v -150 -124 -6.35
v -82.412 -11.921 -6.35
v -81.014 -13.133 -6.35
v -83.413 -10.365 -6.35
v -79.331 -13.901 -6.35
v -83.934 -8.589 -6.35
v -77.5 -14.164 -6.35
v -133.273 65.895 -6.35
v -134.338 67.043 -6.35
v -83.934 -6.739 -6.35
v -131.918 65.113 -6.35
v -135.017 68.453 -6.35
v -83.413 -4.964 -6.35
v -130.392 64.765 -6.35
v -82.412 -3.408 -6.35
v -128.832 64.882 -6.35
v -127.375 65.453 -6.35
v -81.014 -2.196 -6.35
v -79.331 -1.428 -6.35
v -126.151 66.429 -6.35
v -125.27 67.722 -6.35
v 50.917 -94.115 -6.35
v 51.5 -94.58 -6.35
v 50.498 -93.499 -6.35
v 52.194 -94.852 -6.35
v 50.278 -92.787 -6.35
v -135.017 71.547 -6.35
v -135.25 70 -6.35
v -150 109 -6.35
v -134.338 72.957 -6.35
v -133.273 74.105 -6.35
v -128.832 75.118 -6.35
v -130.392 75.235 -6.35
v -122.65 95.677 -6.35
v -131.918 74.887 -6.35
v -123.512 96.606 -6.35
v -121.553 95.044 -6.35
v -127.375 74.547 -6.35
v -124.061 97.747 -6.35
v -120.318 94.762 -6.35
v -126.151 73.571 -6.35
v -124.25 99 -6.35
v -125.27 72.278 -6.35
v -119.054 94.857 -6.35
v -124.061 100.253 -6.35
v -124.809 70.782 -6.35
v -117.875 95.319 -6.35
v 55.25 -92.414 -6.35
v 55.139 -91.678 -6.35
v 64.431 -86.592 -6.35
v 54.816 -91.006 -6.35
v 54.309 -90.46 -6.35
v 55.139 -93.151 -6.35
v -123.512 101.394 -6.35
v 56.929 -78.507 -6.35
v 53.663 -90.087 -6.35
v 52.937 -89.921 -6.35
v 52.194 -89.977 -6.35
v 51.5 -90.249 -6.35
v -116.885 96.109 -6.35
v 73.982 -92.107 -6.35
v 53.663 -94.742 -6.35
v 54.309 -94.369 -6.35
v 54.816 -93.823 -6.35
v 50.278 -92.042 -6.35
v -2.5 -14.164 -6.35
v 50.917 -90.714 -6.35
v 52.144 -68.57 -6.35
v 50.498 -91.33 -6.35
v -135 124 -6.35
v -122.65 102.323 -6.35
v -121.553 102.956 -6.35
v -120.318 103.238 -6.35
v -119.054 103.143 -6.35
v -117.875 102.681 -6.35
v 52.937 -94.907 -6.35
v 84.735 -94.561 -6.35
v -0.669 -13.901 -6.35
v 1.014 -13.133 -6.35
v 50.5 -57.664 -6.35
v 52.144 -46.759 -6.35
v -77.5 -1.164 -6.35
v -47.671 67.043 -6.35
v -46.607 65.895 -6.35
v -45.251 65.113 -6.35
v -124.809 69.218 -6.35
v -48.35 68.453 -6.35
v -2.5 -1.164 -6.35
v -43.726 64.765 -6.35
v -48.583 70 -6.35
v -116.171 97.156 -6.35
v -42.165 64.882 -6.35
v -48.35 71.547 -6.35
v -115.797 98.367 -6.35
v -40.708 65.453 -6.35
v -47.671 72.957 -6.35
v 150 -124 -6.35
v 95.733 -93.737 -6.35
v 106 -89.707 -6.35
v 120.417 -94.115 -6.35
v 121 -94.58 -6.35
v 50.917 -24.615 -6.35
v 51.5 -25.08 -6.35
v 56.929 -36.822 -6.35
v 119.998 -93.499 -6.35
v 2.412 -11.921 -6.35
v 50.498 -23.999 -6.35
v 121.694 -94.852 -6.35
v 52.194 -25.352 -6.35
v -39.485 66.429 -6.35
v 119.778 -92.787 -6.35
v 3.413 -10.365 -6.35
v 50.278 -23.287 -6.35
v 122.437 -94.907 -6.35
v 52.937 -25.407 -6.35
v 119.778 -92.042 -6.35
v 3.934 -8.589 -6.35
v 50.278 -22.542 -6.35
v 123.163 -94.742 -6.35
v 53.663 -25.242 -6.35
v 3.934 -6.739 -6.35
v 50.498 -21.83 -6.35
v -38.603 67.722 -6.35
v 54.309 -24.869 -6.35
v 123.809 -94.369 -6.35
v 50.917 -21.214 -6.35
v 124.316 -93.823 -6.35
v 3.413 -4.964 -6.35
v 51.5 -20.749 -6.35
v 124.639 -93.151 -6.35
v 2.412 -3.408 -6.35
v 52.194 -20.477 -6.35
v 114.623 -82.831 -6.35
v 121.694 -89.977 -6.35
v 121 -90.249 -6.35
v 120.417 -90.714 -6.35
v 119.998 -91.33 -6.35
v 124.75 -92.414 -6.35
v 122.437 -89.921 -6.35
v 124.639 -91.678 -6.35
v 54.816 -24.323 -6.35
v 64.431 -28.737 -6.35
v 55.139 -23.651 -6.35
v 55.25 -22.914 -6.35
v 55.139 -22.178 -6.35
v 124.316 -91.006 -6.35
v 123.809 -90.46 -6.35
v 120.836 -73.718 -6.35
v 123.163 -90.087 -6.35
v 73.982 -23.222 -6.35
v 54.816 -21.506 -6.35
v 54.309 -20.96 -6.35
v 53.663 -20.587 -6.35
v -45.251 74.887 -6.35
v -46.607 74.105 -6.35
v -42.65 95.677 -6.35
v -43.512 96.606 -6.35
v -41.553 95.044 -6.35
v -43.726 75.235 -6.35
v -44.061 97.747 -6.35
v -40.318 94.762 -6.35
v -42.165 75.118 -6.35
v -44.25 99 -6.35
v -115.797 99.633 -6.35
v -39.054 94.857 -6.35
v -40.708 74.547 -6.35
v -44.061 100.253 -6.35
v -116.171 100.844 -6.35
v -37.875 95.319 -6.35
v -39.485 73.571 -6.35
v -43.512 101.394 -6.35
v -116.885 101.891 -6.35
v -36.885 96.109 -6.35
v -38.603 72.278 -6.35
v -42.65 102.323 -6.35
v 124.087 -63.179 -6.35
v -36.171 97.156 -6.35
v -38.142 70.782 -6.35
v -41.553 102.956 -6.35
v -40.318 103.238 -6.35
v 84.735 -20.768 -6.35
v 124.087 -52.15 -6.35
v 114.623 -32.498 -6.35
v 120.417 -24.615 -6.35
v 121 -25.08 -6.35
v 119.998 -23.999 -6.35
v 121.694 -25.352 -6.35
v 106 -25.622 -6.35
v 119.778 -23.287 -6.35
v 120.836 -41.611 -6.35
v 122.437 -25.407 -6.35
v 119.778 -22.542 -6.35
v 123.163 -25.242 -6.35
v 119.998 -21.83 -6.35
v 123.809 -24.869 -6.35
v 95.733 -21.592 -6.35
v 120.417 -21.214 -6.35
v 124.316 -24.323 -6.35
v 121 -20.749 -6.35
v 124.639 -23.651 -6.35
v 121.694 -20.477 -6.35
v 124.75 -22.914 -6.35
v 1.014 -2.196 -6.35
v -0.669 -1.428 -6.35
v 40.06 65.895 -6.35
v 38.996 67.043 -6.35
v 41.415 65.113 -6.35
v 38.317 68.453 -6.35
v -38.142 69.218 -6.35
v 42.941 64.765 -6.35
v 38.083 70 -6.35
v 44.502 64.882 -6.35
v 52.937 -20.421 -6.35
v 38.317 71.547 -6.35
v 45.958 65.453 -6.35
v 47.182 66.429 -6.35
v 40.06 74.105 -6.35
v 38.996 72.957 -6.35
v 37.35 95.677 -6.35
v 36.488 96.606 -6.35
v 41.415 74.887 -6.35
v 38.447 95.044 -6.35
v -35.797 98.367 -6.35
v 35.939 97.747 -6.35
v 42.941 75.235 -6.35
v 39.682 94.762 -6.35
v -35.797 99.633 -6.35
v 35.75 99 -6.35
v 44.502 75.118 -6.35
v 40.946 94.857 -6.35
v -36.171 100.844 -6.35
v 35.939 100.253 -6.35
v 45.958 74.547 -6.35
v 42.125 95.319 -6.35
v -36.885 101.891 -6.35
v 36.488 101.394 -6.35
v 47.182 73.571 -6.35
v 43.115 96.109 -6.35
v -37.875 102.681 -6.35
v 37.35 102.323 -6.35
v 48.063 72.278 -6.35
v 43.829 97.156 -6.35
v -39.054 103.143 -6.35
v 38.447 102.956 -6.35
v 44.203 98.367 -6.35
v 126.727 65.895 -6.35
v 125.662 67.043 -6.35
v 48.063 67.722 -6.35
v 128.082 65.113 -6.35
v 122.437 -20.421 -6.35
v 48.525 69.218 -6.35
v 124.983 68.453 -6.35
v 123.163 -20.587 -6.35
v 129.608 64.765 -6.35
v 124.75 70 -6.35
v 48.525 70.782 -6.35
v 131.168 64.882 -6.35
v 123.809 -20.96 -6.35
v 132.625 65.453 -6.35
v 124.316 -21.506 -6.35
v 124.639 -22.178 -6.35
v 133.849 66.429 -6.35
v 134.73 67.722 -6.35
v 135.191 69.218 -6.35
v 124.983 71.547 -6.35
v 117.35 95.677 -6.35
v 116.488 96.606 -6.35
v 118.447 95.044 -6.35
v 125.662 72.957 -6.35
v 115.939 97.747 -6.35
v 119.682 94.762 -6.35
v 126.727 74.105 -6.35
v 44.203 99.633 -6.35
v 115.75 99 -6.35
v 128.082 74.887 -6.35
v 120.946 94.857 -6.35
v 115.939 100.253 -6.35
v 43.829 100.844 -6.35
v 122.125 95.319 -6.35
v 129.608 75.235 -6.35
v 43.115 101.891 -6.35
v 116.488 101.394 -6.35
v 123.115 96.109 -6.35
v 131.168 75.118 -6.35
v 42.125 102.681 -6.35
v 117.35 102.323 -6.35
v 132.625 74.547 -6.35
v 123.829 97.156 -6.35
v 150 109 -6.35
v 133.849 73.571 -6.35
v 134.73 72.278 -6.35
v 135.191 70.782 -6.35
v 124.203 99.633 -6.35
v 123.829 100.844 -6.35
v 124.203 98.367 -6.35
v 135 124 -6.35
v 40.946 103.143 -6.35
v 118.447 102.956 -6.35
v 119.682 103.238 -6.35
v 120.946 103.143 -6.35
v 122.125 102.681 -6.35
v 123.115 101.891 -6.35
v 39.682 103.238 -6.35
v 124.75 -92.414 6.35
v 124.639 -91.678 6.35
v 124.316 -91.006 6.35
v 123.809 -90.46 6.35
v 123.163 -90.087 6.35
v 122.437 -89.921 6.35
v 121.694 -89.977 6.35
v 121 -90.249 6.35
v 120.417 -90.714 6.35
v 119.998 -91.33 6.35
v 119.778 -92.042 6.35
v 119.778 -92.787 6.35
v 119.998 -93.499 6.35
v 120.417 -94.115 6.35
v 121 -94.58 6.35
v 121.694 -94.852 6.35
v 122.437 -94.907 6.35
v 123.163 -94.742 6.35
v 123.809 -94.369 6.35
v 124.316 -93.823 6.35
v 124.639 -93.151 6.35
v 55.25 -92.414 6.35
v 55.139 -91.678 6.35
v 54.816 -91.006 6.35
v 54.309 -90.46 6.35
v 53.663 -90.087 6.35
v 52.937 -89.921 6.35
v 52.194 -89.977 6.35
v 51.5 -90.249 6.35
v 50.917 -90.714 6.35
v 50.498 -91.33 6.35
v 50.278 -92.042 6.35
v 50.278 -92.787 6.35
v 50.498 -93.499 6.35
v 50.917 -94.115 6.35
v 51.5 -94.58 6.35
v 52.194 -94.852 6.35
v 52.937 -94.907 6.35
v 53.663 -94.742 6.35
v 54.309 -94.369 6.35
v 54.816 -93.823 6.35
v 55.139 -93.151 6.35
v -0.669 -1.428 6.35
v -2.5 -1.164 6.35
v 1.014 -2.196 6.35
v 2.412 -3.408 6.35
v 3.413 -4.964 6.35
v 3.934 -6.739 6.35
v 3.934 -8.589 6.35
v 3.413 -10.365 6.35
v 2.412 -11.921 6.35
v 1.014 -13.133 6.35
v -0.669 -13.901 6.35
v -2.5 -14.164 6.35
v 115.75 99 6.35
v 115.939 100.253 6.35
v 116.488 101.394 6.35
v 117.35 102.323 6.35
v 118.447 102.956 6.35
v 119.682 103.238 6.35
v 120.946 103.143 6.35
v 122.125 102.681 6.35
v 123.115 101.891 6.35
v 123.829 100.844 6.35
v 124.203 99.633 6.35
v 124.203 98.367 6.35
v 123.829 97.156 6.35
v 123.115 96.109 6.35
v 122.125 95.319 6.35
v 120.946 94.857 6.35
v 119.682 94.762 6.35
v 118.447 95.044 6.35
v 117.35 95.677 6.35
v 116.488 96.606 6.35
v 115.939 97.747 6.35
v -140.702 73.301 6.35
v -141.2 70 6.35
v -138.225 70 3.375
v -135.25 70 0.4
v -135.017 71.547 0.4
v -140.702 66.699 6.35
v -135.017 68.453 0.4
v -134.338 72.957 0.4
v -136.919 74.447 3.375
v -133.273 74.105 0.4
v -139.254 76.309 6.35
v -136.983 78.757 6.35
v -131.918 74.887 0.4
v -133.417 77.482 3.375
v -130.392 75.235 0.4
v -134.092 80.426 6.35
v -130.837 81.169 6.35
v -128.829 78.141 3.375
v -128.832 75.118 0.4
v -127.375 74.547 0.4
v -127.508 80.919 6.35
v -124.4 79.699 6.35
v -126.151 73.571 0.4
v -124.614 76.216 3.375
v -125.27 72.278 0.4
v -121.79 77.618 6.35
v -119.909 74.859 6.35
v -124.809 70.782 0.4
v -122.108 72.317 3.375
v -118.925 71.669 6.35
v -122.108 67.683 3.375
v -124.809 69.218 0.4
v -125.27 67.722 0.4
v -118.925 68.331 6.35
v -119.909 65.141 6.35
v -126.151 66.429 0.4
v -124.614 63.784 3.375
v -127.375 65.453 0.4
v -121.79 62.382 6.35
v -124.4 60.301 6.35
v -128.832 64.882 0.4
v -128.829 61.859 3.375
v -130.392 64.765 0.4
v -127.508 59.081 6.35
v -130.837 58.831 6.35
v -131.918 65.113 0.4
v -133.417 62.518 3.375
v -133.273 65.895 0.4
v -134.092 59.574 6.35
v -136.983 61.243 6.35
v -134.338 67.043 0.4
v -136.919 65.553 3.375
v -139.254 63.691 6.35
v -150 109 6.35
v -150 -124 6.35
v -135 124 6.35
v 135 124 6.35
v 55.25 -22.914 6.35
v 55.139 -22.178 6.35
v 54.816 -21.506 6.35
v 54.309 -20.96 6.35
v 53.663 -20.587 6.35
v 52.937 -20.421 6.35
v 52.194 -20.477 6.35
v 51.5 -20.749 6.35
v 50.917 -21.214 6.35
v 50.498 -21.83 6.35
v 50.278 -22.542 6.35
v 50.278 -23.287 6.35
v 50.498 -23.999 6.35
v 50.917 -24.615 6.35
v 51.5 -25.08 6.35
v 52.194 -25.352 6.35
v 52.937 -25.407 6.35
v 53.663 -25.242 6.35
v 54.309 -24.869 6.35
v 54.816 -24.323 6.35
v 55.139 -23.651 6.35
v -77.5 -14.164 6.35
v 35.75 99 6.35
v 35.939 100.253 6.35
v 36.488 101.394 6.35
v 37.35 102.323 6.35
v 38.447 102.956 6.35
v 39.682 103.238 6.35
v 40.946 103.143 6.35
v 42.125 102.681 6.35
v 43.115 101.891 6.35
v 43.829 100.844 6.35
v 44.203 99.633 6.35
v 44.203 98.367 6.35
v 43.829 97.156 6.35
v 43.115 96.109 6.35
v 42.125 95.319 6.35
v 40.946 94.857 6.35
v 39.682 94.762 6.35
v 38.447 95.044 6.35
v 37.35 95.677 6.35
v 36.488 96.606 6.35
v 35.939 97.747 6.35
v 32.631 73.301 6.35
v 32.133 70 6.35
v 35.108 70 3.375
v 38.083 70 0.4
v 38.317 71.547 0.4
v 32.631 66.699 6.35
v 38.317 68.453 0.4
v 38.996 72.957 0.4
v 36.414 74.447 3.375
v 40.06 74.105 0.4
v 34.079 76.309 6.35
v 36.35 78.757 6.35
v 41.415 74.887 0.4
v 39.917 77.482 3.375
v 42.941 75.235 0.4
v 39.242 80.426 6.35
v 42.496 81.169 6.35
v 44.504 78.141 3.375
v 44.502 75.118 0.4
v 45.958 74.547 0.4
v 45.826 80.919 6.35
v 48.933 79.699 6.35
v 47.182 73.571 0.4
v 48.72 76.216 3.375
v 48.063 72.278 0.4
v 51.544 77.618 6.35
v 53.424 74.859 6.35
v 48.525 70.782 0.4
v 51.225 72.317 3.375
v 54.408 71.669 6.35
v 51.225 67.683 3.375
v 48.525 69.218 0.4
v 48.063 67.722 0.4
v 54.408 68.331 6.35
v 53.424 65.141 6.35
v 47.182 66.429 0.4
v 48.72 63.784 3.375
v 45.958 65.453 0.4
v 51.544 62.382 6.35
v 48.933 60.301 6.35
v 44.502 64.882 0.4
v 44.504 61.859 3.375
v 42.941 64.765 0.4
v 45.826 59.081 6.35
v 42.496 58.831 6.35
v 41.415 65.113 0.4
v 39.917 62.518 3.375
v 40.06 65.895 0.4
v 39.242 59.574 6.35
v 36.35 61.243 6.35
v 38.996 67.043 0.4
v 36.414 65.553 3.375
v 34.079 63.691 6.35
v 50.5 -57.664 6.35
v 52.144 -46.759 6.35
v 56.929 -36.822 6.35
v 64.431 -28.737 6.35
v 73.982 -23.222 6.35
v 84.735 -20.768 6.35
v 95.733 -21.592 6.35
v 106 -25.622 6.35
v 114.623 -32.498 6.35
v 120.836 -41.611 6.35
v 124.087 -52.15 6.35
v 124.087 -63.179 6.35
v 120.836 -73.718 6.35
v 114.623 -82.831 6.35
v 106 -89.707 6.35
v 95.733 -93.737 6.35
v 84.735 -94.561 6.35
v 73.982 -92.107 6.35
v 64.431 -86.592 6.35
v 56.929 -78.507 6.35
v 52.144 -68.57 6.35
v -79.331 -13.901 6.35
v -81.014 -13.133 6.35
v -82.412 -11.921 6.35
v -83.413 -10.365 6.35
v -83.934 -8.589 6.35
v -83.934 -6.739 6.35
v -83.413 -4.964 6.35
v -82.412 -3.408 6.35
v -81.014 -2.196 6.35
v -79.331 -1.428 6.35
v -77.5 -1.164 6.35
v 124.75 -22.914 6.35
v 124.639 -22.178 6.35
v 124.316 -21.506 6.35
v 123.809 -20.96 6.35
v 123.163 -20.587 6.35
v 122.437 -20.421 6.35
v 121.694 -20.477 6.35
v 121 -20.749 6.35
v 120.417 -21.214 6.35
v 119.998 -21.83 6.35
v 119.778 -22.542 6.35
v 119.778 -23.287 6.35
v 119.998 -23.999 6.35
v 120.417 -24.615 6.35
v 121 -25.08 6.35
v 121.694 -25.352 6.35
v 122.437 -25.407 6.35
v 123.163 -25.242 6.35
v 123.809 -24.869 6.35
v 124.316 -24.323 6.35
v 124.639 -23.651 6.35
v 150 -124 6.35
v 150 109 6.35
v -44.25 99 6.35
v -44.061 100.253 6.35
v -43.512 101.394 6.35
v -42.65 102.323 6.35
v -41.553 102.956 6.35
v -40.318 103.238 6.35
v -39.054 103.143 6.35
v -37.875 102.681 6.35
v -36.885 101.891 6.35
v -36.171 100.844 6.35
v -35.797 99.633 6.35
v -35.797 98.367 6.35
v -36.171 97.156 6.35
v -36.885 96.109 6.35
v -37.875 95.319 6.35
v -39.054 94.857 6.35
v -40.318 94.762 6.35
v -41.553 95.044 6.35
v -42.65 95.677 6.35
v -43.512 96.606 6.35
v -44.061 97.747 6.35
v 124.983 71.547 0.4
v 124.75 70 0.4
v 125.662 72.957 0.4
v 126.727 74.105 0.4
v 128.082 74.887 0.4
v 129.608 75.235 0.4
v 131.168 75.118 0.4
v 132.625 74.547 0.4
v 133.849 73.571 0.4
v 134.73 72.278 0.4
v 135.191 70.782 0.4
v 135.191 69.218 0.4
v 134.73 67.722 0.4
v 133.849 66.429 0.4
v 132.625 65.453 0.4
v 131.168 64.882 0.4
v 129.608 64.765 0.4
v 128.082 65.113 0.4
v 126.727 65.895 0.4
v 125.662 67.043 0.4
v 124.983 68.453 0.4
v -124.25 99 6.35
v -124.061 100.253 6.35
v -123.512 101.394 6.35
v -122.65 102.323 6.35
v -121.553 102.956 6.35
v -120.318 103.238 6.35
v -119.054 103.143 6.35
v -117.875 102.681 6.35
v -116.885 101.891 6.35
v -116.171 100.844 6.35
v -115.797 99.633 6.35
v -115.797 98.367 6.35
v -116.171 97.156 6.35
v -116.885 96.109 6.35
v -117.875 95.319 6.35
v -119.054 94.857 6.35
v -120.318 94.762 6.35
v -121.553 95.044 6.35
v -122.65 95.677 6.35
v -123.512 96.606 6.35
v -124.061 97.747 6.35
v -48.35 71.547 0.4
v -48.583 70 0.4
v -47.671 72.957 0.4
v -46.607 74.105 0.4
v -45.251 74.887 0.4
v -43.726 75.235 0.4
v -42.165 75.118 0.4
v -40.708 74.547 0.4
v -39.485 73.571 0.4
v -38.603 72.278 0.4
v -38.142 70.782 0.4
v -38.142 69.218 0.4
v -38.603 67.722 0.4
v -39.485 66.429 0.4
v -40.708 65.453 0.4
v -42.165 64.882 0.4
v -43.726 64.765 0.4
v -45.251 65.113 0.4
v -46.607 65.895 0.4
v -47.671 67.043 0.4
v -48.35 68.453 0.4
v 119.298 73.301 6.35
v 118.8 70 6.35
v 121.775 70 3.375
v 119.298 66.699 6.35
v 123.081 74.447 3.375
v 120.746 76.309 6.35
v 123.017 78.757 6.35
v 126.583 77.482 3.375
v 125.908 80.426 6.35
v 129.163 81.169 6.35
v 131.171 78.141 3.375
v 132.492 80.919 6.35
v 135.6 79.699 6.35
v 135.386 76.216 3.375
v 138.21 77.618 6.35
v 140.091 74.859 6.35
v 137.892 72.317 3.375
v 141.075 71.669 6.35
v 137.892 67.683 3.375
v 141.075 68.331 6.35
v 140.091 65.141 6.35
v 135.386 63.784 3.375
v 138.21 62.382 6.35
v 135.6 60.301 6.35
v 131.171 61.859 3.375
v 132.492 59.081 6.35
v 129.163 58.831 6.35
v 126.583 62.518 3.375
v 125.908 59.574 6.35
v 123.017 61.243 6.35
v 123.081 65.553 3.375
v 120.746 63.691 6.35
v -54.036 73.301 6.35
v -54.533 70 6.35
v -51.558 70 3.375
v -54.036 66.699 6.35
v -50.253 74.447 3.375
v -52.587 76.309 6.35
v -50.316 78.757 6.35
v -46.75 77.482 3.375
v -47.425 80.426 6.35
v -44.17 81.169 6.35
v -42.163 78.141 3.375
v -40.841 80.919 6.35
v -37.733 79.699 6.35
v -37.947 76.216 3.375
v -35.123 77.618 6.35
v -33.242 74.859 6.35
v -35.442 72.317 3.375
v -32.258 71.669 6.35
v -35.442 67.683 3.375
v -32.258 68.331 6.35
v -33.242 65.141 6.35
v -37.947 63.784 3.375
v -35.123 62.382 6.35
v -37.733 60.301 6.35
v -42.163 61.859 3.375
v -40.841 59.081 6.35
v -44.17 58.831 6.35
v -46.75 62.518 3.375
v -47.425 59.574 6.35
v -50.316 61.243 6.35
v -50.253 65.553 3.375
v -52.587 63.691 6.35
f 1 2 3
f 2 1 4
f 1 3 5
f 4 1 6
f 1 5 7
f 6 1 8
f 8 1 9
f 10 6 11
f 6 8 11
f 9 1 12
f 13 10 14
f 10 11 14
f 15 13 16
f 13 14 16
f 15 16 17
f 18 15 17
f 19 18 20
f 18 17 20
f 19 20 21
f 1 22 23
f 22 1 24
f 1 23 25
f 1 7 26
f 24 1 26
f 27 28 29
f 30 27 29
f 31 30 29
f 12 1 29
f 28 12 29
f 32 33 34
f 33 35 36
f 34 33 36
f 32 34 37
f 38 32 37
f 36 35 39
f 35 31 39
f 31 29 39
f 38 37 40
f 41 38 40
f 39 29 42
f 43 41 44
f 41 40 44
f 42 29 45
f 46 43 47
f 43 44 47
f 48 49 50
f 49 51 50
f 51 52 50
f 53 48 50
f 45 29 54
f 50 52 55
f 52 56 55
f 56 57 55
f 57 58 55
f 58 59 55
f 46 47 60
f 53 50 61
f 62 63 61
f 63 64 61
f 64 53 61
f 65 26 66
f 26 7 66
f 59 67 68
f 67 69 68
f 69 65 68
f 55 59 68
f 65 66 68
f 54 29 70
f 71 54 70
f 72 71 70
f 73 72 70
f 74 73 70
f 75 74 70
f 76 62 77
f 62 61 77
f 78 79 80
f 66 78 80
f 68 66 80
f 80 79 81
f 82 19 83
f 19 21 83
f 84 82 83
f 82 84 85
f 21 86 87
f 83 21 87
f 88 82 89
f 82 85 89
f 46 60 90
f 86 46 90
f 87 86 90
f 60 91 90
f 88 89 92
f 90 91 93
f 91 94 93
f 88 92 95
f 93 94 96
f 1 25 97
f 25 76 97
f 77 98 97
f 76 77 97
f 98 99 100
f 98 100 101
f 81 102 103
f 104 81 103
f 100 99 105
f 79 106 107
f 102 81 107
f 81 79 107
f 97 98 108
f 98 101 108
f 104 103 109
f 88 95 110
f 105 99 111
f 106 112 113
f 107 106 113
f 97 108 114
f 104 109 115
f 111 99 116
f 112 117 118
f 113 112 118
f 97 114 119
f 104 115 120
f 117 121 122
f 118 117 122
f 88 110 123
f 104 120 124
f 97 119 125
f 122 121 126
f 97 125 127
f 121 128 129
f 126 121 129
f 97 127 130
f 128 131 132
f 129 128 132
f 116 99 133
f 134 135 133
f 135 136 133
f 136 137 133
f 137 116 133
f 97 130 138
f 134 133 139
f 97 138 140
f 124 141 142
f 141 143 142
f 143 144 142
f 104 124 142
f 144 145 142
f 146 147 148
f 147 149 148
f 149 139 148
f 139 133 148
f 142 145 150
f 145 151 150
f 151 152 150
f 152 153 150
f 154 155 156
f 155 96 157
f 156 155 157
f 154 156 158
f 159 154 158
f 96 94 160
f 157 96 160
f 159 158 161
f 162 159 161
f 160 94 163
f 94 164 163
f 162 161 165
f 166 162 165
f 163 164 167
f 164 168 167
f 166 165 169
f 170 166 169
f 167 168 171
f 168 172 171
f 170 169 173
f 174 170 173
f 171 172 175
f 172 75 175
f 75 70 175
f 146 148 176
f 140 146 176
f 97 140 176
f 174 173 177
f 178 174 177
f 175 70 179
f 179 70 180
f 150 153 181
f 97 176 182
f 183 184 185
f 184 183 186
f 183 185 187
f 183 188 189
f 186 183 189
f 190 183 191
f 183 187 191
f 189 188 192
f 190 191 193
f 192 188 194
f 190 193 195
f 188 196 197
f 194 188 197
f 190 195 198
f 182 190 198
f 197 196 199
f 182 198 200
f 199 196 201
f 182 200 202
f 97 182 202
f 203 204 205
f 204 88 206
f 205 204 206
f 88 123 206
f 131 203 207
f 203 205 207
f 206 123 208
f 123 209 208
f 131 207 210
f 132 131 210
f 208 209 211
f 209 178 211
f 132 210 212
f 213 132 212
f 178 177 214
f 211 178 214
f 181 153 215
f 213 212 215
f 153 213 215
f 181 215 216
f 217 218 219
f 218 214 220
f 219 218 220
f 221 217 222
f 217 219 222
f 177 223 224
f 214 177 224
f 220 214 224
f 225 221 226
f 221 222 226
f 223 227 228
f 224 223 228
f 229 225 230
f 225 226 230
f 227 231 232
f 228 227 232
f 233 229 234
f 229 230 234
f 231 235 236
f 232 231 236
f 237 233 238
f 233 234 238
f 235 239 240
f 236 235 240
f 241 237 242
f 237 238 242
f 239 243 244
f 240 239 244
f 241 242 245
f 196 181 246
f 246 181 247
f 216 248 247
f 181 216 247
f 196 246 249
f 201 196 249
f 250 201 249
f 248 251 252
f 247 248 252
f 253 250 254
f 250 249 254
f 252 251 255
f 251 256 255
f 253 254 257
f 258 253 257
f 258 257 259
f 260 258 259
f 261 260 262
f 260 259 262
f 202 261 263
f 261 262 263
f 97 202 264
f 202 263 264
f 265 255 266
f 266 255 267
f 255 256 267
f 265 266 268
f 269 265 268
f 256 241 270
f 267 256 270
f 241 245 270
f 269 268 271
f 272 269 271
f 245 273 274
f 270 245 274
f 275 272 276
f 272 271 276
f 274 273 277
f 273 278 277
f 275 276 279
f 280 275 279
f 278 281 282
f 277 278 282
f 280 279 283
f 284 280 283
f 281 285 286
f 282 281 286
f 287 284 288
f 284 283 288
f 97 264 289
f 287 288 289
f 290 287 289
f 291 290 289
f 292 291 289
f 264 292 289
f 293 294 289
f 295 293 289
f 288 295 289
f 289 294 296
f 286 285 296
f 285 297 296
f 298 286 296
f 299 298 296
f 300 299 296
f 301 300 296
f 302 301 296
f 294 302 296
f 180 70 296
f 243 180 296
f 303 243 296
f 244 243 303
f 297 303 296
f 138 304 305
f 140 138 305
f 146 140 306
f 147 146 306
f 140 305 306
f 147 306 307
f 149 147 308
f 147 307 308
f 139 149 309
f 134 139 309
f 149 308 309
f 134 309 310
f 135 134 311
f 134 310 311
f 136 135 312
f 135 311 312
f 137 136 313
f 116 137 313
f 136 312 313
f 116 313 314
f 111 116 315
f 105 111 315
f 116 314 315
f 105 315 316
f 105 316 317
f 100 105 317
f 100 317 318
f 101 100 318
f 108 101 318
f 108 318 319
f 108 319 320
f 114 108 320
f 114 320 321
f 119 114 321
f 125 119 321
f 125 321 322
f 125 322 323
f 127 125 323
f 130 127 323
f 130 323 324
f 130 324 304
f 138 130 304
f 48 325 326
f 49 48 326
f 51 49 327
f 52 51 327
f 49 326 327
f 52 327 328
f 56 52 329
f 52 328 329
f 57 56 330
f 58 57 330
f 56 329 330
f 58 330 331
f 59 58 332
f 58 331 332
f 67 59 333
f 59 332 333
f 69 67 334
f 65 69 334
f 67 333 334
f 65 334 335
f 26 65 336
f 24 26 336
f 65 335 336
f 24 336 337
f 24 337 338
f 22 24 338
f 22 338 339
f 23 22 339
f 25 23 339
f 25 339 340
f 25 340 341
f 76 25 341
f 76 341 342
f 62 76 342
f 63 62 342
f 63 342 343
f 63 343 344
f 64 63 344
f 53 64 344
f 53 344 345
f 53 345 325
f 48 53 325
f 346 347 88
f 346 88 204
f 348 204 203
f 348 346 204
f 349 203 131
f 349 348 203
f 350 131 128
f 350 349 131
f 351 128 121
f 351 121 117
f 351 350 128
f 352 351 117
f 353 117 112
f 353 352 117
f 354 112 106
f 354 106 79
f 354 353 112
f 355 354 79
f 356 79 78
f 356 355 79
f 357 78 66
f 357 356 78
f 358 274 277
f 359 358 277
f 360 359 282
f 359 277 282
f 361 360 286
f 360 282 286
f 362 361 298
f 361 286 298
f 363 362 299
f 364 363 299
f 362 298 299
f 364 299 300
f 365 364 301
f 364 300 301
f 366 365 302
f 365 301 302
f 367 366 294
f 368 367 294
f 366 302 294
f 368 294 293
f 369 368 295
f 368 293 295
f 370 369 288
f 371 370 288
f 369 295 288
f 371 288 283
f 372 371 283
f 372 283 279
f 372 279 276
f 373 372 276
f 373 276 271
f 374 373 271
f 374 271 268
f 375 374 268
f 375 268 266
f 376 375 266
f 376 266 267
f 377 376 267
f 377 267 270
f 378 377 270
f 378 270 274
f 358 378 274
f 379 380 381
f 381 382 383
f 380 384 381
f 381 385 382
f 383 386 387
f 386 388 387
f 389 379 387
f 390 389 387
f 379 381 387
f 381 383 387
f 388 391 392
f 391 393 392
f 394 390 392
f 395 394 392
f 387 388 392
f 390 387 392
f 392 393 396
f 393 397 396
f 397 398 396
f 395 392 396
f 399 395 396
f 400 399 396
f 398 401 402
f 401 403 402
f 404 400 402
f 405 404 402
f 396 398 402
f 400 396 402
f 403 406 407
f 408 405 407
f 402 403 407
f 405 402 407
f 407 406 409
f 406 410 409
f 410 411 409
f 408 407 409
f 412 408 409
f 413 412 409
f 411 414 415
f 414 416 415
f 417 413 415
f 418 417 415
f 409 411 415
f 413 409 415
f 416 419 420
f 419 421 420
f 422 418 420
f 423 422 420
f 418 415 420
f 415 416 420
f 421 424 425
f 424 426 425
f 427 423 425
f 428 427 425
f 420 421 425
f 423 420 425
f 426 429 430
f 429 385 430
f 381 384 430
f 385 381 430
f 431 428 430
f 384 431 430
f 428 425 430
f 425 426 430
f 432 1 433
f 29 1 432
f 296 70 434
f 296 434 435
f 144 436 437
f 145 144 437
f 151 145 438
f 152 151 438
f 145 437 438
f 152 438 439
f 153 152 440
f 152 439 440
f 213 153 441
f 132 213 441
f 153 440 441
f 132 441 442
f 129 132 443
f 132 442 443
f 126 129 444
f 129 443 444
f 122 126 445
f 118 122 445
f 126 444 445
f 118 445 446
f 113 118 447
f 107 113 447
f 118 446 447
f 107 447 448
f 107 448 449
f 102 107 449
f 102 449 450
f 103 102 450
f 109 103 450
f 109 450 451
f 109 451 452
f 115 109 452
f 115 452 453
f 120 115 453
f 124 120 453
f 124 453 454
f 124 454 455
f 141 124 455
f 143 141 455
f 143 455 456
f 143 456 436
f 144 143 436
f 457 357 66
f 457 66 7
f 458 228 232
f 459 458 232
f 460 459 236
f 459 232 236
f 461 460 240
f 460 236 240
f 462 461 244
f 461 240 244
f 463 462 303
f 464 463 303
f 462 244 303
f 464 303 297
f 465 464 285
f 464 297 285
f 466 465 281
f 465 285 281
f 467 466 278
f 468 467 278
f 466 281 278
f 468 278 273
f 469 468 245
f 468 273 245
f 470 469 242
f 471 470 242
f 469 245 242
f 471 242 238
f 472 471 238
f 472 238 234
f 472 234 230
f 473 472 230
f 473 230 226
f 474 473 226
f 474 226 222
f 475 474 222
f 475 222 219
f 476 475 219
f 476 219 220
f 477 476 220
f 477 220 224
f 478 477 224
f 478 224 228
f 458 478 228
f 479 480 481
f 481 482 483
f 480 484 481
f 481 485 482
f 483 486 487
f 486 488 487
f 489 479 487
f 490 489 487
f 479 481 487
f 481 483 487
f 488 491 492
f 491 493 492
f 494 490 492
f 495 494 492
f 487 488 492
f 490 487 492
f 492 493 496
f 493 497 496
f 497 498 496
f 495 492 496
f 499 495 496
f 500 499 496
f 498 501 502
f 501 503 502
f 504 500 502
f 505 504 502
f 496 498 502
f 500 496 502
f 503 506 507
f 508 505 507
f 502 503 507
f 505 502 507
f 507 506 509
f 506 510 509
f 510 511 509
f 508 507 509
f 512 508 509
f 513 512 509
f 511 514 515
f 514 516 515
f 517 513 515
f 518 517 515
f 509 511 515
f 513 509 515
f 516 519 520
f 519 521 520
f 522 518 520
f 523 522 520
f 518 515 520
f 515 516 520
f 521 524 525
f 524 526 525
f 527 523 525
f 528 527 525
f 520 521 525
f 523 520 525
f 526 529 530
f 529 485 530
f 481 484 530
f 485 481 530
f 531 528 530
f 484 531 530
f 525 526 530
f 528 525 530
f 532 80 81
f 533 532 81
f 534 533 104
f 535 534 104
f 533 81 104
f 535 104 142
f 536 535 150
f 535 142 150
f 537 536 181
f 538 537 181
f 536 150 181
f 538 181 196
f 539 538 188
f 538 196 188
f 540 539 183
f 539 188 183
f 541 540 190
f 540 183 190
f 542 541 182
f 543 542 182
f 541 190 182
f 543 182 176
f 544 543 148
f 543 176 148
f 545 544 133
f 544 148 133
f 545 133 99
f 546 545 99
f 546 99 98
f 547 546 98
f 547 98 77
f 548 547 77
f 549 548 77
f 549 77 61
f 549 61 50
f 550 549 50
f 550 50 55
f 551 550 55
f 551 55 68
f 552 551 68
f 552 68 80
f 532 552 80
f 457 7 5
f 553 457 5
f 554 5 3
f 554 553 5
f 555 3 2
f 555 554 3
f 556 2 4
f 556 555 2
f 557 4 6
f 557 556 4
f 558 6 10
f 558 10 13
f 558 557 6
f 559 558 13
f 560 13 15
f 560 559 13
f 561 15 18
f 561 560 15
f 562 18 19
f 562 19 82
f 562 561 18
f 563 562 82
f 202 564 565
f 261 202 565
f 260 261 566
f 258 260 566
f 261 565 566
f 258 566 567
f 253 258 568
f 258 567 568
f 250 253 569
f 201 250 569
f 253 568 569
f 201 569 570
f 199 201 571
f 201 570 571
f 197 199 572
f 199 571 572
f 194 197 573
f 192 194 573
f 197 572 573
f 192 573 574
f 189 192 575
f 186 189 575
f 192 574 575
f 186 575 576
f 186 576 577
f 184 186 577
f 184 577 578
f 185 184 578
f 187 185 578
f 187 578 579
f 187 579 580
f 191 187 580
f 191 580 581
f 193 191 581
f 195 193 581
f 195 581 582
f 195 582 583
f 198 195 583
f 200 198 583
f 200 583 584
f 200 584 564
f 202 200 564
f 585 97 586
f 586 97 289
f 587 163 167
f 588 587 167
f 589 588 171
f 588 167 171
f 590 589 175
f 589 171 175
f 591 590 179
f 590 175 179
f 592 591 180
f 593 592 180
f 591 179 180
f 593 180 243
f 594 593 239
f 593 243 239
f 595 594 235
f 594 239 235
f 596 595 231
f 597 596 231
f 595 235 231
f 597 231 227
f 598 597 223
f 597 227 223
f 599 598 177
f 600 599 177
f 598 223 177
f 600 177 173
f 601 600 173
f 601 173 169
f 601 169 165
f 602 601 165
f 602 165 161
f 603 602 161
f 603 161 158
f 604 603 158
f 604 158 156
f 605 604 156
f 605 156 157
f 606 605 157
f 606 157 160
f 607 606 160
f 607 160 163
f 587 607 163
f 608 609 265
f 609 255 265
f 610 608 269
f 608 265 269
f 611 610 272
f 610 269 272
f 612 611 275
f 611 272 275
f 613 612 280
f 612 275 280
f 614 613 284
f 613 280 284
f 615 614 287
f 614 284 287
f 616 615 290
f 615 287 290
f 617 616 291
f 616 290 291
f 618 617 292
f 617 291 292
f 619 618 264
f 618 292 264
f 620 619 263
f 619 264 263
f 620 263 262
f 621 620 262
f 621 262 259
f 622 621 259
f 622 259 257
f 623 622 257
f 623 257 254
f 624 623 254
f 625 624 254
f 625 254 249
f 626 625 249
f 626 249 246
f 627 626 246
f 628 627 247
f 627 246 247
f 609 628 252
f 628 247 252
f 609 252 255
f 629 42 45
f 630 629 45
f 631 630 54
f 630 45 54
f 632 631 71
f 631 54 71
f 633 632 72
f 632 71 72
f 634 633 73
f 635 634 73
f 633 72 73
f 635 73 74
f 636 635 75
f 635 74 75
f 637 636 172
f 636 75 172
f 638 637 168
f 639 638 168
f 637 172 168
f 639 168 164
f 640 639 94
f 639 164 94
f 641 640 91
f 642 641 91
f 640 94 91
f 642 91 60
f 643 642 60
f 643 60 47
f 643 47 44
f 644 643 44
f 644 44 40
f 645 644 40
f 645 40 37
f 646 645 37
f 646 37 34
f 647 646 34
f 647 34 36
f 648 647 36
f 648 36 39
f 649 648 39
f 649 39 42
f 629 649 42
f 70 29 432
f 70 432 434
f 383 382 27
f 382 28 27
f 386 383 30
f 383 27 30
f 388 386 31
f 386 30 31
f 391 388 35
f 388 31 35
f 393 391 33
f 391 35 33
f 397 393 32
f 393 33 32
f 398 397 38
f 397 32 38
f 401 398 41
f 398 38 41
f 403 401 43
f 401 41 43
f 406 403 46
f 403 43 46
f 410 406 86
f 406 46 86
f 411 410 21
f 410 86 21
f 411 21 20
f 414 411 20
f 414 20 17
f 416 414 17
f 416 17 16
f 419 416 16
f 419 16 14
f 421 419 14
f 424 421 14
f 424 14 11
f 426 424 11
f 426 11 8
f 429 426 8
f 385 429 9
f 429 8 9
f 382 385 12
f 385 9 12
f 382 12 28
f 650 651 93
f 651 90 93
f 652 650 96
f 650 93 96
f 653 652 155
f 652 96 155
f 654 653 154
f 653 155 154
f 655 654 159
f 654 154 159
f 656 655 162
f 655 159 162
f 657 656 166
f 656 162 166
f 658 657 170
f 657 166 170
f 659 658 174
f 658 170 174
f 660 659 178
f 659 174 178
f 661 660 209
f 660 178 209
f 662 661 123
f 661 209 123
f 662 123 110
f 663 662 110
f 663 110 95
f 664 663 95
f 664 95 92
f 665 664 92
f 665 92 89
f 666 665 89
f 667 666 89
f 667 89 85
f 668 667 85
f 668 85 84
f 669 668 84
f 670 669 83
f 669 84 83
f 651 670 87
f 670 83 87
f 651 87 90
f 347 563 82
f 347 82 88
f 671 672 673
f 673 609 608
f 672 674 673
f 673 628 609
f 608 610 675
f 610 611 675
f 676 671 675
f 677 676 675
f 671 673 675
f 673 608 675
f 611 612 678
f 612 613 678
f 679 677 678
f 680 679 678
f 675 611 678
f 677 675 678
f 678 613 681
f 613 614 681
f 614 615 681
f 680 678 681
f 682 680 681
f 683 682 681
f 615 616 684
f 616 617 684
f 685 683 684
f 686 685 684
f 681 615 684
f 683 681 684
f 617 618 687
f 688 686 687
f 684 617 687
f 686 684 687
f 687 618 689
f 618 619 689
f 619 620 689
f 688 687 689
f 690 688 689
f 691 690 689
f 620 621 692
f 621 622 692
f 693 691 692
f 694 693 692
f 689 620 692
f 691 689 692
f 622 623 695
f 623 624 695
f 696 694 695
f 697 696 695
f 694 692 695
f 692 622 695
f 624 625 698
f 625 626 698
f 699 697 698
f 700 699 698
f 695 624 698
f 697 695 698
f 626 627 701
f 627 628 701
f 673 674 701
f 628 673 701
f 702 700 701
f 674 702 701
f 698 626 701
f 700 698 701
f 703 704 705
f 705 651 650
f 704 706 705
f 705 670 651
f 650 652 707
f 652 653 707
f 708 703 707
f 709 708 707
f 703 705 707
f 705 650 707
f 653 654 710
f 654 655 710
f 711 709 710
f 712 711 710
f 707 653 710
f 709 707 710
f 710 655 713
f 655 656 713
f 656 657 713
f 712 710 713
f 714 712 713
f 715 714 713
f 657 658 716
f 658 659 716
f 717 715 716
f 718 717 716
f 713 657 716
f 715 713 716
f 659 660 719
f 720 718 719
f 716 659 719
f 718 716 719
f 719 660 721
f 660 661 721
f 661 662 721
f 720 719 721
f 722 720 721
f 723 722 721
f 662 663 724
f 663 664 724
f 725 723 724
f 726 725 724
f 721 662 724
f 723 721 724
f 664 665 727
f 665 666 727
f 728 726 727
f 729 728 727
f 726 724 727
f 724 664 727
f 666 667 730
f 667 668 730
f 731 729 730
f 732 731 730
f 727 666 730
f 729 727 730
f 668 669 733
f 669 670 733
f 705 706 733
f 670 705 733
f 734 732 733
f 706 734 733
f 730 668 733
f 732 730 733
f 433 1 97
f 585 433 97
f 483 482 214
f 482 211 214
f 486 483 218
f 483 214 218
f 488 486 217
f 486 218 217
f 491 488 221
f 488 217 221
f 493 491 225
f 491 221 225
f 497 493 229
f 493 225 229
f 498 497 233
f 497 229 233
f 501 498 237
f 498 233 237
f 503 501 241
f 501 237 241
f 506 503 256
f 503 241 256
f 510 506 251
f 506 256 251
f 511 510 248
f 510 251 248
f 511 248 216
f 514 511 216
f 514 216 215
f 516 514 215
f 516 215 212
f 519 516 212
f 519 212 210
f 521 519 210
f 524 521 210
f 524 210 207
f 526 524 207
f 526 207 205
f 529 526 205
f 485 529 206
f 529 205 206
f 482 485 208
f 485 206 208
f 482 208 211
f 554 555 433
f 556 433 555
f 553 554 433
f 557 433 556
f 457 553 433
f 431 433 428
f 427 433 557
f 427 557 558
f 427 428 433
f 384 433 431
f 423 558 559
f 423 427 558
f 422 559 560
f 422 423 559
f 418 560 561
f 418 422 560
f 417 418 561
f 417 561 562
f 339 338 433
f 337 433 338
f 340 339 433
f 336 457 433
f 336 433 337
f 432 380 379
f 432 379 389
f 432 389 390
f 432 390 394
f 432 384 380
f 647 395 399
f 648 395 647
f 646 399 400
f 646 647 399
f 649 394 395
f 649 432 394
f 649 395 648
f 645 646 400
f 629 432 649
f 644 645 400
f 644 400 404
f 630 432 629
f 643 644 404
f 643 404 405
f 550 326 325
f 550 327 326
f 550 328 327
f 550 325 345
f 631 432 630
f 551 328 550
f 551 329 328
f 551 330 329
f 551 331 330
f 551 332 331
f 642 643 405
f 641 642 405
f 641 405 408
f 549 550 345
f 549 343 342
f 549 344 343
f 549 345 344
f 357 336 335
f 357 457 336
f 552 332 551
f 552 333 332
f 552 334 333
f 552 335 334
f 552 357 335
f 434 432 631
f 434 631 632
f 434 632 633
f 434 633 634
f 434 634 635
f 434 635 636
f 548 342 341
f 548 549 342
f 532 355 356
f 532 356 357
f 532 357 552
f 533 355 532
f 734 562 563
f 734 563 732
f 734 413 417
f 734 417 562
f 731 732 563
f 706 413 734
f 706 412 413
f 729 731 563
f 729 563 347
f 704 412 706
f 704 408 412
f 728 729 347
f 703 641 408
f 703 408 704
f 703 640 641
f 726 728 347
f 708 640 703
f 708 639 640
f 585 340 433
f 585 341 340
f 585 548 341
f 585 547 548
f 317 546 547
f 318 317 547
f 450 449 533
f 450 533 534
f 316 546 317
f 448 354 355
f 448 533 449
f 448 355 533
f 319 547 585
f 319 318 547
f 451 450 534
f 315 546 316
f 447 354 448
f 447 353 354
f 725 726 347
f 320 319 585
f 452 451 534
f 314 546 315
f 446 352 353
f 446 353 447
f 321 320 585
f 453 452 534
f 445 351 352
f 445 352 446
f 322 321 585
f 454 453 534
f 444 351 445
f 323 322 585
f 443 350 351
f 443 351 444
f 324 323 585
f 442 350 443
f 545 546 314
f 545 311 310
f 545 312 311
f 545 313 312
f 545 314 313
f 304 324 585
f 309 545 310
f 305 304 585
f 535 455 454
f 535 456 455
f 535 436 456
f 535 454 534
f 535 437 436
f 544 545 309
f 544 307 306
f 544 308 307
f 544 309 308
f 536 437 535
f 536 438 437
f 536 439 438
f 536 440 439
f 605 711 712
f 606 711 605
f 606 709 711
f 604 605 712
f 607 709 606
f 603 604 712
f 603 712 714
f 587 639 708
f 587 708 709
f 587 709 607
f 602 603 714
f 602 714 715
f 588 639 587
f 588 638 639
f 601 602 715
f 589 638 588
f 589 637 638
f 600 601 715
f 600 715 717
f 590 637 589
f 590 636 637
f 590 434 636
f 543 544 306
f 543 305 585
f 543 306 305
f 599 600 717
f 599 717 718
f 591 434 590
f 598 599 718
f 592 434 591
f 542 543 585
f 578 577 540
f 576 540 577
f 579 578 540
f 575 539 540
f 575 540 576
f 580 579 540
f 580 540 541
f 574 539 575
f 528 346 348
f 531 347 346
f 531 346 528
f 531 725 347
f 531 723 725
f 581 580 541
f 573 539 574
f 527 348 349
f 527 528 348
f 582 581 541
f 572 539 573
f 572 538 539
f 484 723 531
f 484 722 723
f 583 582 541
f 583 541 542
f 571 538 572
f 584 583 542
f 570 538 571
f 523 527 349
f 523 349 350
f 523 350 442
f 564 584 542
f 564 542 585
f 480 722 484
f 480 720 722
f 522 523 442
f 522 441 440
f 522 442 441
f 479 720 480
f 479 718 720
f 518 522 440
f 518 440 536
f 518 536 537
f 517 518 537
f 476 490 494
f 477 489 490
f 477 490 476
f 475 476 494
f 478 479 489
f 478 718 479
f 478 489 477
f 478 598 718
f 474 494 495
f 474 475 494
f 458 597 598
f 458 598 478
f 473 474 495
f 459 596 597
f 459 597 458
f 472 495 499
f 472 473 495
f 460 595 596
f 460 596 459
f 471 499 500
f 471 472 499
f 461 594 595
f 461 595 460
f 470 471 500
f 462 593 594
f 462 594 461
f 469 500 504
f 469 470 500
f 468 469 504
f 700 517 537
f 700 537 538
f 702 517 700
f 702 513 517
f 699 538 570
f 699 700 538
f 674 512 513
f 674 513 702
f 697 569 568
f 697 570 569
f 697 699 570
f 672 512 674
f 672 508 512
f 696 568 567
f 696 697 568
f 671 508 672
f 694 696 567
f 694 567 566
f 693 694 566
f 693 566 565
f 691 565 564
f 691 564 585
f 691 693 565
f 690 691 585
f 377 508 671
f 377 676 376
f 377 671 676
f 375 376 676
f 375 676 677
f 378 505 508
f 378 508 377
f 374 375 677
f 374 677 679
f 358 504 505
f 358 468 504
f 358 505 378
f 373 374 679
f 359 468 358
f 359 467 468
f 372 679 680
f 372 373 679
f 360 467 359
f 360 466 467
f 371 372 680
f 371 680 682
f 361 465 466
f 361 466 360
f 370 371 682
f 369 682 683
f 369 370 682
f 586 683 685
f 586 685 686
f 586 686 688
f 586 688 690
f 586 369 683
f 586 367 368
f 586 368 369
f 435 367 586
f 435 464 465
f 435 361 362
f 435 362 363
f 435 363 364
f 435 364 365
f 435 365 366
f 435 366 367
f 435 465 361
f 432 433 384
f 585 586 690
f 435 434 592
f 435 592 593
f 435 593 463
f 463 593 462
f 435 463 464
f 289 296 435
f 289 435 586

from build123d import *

# Parameters (mm, degrees)
FLANGE_BASE1_START                    = -6.35
FLANGE_BASE1_OUTLINE_W                = 300
FLANGE_BASE1_OUTLINE_H                = 248
FLANGE_BASE1_DEPTH                    = 12.7
QUEBRA_CANTO1_START                   = -6.35
QUEBRA_CANTO1_DEPTH                   = 12.7
FURO_ROSCADO_DE_M10X1_52_D            = 8.5
FURO_ROSCADO_DE_M10X1_52_DEPTH        = 29.946342369
FURO_ROSCADO_DE_M10X1_52_TIP          = 2.553657631
ESBO_O11_R                            = 16.5
CORTE_EXTRUS_O1_DEPTH                 = 196.031510275
ESBO_O12_R                            = 37
CORTE_EXTRUS_O2_DEPTH                 = 196.031510275
FURO_ROSCADO_DE_M6X1_01_D             = 5
CORTE_EXTRUS_O5_DEPTH                 = 12.7
ESCAREADO_PARA_SFHCS_M101_D           = 10.5
ESCAREADO_PARA_SFHCS_M101_DEPTH       = 32.5
ESCAREADO_PARA_SFHCS_M101_CSINK_D     = 22.4
ESCAREADO_PARA_SFHCS_M101_CSINK_ANGLE = 90
ESCAREADO_PARA_SFHCS_M101_TIP         = 3.15451825


# Read off the part's stored shape, not the designer's step: Flange-base1, Quebra-Canto1
with BuildPart() as part:
    # Flange-base1 outline → Flange-base1 (new body)
    with BuildSketch(Plane.XY.offset(FLANGE_BASE1_START)):
        Rectangle(FLANGE_BASE1_OUTLINE_W, FLANGE_BASE1_OUTLINE_H)
    extrude(amount=FLANGE_BASE1_DEPTH)

    # Quebra-Canto1 outline → Quebra-Canto1 (cut)
    with BuildSketch(Plane.XY.offset(QUEBRA_CANTO1_START)):
        Polygon((-150, 124), (-150, 109), (-135, 124), align=None)
        Polygon((150, 124), (135, 124), (150, 109), align=None)
    extrude(amount=QUEBRA_CANTO1_DEPTH, mode=Mode.SUBTRACT)

    # Furo roscado de M10x1.52
    with Locations(Plane.XY.offset(6.35)):
        with Locations((-40, 99), (-120, 99), (40, 99), (120, 99)):
            Hole(FURO_ROSCADO_DE_M10X1_52_D / 2, depth=FURO_ROSCADO_DE_M10X1_52_DEPTH)
            with Locations((0, 0, -(FURO_ROSCADO_DE_M10X1_52_DEPTH + FURO_ROSCADO_DE_M10X1_52_TIP / 2))):  # 118° drill point
                Cone(0, FURO_ROSCADO_DE_M10X1_52_D / 2, FURO_ROSCADO_DE_M10X1_52_TIP, mode=Mode.SUBTRACT)

    # Esboço11 → Corte-extrusão1 (cut, through all)
    with BuildSketch(Plane.XY.offset(6.35)):
        with Locations((87.5, -57.664450339)):
            Circle(ESBO_O11_R)
    extrude(amount=-CORTE_EXTRUS_O1_DEPTH, mode=Mode.SUBTRACT)

    # Esboço12 → Corte-extrusão2 (cut, through all)
    with BuildSketch(Plane(origin=(0, 0, -6.35), x_dir=(-1, 0, 0), z_dir=(0, 0, -1))):
        with Locations((-87.5, -57.664450339)):
            Circle(ESBO_O12_R)
    extrude(amount=-CORTE_EXTRUS_O2_DEPTH, mode=Mode.SUBTRACT)

    # Furo roscado de M6x1.01 (through all)
    with Locations(Plane(origin=(0, 0, -6.35), x_dir=(-1, 0, 0), z_dir=(0, 0, -1))):
        with Locations((-122.25, -22.914450339), (-87.5, -57.664450339), (-52.75, -92.414450339), (-52.75, -22.914450339), (-122.25, -92.414450339)):
            Hole(FURO_ROSCADO_DE_M6X1_01_D / 2)

    # Esboço20 → Corte-extrusão5 (cut)
    with BuildSketch(Plane.XY.offset(6.35)):
        with BuildLine():
            Line((-2.5, -14.164450339), (-77.5, -14.164450339))
            ThreePointArc((-77.5, -14.164450339), (-84, -7.664450339), (-77.5, -1.164450339))
            Line((-77.5, -1.164450339), (-2.5, -1.164450339))
            ThreePointArc((-2.5, -1.164450339), (4, -7.664450339), (-2.5, -14.164450339))
        make_face()
    extrude(amount=-CORTE_EXTRUS_O5_DEPTH, mode=Mode.SUBTRACT)

    # Escareado para SFHCS M101
    with Locations(Plane.XY.offset(6.35)):
        with Locations((-130, 70), (-43.333333333, 70), (43.333333333, 70), (130, 70)):
            CounterSinkHole(ESCAREADO_PARA_SFHCS_M101_D / 2, ESCAREADO_PARA_SFHCS_M101_CSINK_D / 2, depth=ESCAREADO_PARA_SFHCS_M101_DEPTH, counter_sink_angle=ESCAREADO_PARA_SFHCS_M101_CSINK_ANGLE)
            with Locations((0, 0, -(ESCAREADO_PARA_SFHCS_M101_DEPTH + ESCAREADO_PARA_SFHCS_M101_TIP / 2))):  # 118° drill point
                Cone(0, ESCAREADO_PARA_SFHCS_M101_D / 2, ESCAREADO_PARA_SFHCS_M101_TIP, mode=Mode.SUBTRACT)


solid = part.part
